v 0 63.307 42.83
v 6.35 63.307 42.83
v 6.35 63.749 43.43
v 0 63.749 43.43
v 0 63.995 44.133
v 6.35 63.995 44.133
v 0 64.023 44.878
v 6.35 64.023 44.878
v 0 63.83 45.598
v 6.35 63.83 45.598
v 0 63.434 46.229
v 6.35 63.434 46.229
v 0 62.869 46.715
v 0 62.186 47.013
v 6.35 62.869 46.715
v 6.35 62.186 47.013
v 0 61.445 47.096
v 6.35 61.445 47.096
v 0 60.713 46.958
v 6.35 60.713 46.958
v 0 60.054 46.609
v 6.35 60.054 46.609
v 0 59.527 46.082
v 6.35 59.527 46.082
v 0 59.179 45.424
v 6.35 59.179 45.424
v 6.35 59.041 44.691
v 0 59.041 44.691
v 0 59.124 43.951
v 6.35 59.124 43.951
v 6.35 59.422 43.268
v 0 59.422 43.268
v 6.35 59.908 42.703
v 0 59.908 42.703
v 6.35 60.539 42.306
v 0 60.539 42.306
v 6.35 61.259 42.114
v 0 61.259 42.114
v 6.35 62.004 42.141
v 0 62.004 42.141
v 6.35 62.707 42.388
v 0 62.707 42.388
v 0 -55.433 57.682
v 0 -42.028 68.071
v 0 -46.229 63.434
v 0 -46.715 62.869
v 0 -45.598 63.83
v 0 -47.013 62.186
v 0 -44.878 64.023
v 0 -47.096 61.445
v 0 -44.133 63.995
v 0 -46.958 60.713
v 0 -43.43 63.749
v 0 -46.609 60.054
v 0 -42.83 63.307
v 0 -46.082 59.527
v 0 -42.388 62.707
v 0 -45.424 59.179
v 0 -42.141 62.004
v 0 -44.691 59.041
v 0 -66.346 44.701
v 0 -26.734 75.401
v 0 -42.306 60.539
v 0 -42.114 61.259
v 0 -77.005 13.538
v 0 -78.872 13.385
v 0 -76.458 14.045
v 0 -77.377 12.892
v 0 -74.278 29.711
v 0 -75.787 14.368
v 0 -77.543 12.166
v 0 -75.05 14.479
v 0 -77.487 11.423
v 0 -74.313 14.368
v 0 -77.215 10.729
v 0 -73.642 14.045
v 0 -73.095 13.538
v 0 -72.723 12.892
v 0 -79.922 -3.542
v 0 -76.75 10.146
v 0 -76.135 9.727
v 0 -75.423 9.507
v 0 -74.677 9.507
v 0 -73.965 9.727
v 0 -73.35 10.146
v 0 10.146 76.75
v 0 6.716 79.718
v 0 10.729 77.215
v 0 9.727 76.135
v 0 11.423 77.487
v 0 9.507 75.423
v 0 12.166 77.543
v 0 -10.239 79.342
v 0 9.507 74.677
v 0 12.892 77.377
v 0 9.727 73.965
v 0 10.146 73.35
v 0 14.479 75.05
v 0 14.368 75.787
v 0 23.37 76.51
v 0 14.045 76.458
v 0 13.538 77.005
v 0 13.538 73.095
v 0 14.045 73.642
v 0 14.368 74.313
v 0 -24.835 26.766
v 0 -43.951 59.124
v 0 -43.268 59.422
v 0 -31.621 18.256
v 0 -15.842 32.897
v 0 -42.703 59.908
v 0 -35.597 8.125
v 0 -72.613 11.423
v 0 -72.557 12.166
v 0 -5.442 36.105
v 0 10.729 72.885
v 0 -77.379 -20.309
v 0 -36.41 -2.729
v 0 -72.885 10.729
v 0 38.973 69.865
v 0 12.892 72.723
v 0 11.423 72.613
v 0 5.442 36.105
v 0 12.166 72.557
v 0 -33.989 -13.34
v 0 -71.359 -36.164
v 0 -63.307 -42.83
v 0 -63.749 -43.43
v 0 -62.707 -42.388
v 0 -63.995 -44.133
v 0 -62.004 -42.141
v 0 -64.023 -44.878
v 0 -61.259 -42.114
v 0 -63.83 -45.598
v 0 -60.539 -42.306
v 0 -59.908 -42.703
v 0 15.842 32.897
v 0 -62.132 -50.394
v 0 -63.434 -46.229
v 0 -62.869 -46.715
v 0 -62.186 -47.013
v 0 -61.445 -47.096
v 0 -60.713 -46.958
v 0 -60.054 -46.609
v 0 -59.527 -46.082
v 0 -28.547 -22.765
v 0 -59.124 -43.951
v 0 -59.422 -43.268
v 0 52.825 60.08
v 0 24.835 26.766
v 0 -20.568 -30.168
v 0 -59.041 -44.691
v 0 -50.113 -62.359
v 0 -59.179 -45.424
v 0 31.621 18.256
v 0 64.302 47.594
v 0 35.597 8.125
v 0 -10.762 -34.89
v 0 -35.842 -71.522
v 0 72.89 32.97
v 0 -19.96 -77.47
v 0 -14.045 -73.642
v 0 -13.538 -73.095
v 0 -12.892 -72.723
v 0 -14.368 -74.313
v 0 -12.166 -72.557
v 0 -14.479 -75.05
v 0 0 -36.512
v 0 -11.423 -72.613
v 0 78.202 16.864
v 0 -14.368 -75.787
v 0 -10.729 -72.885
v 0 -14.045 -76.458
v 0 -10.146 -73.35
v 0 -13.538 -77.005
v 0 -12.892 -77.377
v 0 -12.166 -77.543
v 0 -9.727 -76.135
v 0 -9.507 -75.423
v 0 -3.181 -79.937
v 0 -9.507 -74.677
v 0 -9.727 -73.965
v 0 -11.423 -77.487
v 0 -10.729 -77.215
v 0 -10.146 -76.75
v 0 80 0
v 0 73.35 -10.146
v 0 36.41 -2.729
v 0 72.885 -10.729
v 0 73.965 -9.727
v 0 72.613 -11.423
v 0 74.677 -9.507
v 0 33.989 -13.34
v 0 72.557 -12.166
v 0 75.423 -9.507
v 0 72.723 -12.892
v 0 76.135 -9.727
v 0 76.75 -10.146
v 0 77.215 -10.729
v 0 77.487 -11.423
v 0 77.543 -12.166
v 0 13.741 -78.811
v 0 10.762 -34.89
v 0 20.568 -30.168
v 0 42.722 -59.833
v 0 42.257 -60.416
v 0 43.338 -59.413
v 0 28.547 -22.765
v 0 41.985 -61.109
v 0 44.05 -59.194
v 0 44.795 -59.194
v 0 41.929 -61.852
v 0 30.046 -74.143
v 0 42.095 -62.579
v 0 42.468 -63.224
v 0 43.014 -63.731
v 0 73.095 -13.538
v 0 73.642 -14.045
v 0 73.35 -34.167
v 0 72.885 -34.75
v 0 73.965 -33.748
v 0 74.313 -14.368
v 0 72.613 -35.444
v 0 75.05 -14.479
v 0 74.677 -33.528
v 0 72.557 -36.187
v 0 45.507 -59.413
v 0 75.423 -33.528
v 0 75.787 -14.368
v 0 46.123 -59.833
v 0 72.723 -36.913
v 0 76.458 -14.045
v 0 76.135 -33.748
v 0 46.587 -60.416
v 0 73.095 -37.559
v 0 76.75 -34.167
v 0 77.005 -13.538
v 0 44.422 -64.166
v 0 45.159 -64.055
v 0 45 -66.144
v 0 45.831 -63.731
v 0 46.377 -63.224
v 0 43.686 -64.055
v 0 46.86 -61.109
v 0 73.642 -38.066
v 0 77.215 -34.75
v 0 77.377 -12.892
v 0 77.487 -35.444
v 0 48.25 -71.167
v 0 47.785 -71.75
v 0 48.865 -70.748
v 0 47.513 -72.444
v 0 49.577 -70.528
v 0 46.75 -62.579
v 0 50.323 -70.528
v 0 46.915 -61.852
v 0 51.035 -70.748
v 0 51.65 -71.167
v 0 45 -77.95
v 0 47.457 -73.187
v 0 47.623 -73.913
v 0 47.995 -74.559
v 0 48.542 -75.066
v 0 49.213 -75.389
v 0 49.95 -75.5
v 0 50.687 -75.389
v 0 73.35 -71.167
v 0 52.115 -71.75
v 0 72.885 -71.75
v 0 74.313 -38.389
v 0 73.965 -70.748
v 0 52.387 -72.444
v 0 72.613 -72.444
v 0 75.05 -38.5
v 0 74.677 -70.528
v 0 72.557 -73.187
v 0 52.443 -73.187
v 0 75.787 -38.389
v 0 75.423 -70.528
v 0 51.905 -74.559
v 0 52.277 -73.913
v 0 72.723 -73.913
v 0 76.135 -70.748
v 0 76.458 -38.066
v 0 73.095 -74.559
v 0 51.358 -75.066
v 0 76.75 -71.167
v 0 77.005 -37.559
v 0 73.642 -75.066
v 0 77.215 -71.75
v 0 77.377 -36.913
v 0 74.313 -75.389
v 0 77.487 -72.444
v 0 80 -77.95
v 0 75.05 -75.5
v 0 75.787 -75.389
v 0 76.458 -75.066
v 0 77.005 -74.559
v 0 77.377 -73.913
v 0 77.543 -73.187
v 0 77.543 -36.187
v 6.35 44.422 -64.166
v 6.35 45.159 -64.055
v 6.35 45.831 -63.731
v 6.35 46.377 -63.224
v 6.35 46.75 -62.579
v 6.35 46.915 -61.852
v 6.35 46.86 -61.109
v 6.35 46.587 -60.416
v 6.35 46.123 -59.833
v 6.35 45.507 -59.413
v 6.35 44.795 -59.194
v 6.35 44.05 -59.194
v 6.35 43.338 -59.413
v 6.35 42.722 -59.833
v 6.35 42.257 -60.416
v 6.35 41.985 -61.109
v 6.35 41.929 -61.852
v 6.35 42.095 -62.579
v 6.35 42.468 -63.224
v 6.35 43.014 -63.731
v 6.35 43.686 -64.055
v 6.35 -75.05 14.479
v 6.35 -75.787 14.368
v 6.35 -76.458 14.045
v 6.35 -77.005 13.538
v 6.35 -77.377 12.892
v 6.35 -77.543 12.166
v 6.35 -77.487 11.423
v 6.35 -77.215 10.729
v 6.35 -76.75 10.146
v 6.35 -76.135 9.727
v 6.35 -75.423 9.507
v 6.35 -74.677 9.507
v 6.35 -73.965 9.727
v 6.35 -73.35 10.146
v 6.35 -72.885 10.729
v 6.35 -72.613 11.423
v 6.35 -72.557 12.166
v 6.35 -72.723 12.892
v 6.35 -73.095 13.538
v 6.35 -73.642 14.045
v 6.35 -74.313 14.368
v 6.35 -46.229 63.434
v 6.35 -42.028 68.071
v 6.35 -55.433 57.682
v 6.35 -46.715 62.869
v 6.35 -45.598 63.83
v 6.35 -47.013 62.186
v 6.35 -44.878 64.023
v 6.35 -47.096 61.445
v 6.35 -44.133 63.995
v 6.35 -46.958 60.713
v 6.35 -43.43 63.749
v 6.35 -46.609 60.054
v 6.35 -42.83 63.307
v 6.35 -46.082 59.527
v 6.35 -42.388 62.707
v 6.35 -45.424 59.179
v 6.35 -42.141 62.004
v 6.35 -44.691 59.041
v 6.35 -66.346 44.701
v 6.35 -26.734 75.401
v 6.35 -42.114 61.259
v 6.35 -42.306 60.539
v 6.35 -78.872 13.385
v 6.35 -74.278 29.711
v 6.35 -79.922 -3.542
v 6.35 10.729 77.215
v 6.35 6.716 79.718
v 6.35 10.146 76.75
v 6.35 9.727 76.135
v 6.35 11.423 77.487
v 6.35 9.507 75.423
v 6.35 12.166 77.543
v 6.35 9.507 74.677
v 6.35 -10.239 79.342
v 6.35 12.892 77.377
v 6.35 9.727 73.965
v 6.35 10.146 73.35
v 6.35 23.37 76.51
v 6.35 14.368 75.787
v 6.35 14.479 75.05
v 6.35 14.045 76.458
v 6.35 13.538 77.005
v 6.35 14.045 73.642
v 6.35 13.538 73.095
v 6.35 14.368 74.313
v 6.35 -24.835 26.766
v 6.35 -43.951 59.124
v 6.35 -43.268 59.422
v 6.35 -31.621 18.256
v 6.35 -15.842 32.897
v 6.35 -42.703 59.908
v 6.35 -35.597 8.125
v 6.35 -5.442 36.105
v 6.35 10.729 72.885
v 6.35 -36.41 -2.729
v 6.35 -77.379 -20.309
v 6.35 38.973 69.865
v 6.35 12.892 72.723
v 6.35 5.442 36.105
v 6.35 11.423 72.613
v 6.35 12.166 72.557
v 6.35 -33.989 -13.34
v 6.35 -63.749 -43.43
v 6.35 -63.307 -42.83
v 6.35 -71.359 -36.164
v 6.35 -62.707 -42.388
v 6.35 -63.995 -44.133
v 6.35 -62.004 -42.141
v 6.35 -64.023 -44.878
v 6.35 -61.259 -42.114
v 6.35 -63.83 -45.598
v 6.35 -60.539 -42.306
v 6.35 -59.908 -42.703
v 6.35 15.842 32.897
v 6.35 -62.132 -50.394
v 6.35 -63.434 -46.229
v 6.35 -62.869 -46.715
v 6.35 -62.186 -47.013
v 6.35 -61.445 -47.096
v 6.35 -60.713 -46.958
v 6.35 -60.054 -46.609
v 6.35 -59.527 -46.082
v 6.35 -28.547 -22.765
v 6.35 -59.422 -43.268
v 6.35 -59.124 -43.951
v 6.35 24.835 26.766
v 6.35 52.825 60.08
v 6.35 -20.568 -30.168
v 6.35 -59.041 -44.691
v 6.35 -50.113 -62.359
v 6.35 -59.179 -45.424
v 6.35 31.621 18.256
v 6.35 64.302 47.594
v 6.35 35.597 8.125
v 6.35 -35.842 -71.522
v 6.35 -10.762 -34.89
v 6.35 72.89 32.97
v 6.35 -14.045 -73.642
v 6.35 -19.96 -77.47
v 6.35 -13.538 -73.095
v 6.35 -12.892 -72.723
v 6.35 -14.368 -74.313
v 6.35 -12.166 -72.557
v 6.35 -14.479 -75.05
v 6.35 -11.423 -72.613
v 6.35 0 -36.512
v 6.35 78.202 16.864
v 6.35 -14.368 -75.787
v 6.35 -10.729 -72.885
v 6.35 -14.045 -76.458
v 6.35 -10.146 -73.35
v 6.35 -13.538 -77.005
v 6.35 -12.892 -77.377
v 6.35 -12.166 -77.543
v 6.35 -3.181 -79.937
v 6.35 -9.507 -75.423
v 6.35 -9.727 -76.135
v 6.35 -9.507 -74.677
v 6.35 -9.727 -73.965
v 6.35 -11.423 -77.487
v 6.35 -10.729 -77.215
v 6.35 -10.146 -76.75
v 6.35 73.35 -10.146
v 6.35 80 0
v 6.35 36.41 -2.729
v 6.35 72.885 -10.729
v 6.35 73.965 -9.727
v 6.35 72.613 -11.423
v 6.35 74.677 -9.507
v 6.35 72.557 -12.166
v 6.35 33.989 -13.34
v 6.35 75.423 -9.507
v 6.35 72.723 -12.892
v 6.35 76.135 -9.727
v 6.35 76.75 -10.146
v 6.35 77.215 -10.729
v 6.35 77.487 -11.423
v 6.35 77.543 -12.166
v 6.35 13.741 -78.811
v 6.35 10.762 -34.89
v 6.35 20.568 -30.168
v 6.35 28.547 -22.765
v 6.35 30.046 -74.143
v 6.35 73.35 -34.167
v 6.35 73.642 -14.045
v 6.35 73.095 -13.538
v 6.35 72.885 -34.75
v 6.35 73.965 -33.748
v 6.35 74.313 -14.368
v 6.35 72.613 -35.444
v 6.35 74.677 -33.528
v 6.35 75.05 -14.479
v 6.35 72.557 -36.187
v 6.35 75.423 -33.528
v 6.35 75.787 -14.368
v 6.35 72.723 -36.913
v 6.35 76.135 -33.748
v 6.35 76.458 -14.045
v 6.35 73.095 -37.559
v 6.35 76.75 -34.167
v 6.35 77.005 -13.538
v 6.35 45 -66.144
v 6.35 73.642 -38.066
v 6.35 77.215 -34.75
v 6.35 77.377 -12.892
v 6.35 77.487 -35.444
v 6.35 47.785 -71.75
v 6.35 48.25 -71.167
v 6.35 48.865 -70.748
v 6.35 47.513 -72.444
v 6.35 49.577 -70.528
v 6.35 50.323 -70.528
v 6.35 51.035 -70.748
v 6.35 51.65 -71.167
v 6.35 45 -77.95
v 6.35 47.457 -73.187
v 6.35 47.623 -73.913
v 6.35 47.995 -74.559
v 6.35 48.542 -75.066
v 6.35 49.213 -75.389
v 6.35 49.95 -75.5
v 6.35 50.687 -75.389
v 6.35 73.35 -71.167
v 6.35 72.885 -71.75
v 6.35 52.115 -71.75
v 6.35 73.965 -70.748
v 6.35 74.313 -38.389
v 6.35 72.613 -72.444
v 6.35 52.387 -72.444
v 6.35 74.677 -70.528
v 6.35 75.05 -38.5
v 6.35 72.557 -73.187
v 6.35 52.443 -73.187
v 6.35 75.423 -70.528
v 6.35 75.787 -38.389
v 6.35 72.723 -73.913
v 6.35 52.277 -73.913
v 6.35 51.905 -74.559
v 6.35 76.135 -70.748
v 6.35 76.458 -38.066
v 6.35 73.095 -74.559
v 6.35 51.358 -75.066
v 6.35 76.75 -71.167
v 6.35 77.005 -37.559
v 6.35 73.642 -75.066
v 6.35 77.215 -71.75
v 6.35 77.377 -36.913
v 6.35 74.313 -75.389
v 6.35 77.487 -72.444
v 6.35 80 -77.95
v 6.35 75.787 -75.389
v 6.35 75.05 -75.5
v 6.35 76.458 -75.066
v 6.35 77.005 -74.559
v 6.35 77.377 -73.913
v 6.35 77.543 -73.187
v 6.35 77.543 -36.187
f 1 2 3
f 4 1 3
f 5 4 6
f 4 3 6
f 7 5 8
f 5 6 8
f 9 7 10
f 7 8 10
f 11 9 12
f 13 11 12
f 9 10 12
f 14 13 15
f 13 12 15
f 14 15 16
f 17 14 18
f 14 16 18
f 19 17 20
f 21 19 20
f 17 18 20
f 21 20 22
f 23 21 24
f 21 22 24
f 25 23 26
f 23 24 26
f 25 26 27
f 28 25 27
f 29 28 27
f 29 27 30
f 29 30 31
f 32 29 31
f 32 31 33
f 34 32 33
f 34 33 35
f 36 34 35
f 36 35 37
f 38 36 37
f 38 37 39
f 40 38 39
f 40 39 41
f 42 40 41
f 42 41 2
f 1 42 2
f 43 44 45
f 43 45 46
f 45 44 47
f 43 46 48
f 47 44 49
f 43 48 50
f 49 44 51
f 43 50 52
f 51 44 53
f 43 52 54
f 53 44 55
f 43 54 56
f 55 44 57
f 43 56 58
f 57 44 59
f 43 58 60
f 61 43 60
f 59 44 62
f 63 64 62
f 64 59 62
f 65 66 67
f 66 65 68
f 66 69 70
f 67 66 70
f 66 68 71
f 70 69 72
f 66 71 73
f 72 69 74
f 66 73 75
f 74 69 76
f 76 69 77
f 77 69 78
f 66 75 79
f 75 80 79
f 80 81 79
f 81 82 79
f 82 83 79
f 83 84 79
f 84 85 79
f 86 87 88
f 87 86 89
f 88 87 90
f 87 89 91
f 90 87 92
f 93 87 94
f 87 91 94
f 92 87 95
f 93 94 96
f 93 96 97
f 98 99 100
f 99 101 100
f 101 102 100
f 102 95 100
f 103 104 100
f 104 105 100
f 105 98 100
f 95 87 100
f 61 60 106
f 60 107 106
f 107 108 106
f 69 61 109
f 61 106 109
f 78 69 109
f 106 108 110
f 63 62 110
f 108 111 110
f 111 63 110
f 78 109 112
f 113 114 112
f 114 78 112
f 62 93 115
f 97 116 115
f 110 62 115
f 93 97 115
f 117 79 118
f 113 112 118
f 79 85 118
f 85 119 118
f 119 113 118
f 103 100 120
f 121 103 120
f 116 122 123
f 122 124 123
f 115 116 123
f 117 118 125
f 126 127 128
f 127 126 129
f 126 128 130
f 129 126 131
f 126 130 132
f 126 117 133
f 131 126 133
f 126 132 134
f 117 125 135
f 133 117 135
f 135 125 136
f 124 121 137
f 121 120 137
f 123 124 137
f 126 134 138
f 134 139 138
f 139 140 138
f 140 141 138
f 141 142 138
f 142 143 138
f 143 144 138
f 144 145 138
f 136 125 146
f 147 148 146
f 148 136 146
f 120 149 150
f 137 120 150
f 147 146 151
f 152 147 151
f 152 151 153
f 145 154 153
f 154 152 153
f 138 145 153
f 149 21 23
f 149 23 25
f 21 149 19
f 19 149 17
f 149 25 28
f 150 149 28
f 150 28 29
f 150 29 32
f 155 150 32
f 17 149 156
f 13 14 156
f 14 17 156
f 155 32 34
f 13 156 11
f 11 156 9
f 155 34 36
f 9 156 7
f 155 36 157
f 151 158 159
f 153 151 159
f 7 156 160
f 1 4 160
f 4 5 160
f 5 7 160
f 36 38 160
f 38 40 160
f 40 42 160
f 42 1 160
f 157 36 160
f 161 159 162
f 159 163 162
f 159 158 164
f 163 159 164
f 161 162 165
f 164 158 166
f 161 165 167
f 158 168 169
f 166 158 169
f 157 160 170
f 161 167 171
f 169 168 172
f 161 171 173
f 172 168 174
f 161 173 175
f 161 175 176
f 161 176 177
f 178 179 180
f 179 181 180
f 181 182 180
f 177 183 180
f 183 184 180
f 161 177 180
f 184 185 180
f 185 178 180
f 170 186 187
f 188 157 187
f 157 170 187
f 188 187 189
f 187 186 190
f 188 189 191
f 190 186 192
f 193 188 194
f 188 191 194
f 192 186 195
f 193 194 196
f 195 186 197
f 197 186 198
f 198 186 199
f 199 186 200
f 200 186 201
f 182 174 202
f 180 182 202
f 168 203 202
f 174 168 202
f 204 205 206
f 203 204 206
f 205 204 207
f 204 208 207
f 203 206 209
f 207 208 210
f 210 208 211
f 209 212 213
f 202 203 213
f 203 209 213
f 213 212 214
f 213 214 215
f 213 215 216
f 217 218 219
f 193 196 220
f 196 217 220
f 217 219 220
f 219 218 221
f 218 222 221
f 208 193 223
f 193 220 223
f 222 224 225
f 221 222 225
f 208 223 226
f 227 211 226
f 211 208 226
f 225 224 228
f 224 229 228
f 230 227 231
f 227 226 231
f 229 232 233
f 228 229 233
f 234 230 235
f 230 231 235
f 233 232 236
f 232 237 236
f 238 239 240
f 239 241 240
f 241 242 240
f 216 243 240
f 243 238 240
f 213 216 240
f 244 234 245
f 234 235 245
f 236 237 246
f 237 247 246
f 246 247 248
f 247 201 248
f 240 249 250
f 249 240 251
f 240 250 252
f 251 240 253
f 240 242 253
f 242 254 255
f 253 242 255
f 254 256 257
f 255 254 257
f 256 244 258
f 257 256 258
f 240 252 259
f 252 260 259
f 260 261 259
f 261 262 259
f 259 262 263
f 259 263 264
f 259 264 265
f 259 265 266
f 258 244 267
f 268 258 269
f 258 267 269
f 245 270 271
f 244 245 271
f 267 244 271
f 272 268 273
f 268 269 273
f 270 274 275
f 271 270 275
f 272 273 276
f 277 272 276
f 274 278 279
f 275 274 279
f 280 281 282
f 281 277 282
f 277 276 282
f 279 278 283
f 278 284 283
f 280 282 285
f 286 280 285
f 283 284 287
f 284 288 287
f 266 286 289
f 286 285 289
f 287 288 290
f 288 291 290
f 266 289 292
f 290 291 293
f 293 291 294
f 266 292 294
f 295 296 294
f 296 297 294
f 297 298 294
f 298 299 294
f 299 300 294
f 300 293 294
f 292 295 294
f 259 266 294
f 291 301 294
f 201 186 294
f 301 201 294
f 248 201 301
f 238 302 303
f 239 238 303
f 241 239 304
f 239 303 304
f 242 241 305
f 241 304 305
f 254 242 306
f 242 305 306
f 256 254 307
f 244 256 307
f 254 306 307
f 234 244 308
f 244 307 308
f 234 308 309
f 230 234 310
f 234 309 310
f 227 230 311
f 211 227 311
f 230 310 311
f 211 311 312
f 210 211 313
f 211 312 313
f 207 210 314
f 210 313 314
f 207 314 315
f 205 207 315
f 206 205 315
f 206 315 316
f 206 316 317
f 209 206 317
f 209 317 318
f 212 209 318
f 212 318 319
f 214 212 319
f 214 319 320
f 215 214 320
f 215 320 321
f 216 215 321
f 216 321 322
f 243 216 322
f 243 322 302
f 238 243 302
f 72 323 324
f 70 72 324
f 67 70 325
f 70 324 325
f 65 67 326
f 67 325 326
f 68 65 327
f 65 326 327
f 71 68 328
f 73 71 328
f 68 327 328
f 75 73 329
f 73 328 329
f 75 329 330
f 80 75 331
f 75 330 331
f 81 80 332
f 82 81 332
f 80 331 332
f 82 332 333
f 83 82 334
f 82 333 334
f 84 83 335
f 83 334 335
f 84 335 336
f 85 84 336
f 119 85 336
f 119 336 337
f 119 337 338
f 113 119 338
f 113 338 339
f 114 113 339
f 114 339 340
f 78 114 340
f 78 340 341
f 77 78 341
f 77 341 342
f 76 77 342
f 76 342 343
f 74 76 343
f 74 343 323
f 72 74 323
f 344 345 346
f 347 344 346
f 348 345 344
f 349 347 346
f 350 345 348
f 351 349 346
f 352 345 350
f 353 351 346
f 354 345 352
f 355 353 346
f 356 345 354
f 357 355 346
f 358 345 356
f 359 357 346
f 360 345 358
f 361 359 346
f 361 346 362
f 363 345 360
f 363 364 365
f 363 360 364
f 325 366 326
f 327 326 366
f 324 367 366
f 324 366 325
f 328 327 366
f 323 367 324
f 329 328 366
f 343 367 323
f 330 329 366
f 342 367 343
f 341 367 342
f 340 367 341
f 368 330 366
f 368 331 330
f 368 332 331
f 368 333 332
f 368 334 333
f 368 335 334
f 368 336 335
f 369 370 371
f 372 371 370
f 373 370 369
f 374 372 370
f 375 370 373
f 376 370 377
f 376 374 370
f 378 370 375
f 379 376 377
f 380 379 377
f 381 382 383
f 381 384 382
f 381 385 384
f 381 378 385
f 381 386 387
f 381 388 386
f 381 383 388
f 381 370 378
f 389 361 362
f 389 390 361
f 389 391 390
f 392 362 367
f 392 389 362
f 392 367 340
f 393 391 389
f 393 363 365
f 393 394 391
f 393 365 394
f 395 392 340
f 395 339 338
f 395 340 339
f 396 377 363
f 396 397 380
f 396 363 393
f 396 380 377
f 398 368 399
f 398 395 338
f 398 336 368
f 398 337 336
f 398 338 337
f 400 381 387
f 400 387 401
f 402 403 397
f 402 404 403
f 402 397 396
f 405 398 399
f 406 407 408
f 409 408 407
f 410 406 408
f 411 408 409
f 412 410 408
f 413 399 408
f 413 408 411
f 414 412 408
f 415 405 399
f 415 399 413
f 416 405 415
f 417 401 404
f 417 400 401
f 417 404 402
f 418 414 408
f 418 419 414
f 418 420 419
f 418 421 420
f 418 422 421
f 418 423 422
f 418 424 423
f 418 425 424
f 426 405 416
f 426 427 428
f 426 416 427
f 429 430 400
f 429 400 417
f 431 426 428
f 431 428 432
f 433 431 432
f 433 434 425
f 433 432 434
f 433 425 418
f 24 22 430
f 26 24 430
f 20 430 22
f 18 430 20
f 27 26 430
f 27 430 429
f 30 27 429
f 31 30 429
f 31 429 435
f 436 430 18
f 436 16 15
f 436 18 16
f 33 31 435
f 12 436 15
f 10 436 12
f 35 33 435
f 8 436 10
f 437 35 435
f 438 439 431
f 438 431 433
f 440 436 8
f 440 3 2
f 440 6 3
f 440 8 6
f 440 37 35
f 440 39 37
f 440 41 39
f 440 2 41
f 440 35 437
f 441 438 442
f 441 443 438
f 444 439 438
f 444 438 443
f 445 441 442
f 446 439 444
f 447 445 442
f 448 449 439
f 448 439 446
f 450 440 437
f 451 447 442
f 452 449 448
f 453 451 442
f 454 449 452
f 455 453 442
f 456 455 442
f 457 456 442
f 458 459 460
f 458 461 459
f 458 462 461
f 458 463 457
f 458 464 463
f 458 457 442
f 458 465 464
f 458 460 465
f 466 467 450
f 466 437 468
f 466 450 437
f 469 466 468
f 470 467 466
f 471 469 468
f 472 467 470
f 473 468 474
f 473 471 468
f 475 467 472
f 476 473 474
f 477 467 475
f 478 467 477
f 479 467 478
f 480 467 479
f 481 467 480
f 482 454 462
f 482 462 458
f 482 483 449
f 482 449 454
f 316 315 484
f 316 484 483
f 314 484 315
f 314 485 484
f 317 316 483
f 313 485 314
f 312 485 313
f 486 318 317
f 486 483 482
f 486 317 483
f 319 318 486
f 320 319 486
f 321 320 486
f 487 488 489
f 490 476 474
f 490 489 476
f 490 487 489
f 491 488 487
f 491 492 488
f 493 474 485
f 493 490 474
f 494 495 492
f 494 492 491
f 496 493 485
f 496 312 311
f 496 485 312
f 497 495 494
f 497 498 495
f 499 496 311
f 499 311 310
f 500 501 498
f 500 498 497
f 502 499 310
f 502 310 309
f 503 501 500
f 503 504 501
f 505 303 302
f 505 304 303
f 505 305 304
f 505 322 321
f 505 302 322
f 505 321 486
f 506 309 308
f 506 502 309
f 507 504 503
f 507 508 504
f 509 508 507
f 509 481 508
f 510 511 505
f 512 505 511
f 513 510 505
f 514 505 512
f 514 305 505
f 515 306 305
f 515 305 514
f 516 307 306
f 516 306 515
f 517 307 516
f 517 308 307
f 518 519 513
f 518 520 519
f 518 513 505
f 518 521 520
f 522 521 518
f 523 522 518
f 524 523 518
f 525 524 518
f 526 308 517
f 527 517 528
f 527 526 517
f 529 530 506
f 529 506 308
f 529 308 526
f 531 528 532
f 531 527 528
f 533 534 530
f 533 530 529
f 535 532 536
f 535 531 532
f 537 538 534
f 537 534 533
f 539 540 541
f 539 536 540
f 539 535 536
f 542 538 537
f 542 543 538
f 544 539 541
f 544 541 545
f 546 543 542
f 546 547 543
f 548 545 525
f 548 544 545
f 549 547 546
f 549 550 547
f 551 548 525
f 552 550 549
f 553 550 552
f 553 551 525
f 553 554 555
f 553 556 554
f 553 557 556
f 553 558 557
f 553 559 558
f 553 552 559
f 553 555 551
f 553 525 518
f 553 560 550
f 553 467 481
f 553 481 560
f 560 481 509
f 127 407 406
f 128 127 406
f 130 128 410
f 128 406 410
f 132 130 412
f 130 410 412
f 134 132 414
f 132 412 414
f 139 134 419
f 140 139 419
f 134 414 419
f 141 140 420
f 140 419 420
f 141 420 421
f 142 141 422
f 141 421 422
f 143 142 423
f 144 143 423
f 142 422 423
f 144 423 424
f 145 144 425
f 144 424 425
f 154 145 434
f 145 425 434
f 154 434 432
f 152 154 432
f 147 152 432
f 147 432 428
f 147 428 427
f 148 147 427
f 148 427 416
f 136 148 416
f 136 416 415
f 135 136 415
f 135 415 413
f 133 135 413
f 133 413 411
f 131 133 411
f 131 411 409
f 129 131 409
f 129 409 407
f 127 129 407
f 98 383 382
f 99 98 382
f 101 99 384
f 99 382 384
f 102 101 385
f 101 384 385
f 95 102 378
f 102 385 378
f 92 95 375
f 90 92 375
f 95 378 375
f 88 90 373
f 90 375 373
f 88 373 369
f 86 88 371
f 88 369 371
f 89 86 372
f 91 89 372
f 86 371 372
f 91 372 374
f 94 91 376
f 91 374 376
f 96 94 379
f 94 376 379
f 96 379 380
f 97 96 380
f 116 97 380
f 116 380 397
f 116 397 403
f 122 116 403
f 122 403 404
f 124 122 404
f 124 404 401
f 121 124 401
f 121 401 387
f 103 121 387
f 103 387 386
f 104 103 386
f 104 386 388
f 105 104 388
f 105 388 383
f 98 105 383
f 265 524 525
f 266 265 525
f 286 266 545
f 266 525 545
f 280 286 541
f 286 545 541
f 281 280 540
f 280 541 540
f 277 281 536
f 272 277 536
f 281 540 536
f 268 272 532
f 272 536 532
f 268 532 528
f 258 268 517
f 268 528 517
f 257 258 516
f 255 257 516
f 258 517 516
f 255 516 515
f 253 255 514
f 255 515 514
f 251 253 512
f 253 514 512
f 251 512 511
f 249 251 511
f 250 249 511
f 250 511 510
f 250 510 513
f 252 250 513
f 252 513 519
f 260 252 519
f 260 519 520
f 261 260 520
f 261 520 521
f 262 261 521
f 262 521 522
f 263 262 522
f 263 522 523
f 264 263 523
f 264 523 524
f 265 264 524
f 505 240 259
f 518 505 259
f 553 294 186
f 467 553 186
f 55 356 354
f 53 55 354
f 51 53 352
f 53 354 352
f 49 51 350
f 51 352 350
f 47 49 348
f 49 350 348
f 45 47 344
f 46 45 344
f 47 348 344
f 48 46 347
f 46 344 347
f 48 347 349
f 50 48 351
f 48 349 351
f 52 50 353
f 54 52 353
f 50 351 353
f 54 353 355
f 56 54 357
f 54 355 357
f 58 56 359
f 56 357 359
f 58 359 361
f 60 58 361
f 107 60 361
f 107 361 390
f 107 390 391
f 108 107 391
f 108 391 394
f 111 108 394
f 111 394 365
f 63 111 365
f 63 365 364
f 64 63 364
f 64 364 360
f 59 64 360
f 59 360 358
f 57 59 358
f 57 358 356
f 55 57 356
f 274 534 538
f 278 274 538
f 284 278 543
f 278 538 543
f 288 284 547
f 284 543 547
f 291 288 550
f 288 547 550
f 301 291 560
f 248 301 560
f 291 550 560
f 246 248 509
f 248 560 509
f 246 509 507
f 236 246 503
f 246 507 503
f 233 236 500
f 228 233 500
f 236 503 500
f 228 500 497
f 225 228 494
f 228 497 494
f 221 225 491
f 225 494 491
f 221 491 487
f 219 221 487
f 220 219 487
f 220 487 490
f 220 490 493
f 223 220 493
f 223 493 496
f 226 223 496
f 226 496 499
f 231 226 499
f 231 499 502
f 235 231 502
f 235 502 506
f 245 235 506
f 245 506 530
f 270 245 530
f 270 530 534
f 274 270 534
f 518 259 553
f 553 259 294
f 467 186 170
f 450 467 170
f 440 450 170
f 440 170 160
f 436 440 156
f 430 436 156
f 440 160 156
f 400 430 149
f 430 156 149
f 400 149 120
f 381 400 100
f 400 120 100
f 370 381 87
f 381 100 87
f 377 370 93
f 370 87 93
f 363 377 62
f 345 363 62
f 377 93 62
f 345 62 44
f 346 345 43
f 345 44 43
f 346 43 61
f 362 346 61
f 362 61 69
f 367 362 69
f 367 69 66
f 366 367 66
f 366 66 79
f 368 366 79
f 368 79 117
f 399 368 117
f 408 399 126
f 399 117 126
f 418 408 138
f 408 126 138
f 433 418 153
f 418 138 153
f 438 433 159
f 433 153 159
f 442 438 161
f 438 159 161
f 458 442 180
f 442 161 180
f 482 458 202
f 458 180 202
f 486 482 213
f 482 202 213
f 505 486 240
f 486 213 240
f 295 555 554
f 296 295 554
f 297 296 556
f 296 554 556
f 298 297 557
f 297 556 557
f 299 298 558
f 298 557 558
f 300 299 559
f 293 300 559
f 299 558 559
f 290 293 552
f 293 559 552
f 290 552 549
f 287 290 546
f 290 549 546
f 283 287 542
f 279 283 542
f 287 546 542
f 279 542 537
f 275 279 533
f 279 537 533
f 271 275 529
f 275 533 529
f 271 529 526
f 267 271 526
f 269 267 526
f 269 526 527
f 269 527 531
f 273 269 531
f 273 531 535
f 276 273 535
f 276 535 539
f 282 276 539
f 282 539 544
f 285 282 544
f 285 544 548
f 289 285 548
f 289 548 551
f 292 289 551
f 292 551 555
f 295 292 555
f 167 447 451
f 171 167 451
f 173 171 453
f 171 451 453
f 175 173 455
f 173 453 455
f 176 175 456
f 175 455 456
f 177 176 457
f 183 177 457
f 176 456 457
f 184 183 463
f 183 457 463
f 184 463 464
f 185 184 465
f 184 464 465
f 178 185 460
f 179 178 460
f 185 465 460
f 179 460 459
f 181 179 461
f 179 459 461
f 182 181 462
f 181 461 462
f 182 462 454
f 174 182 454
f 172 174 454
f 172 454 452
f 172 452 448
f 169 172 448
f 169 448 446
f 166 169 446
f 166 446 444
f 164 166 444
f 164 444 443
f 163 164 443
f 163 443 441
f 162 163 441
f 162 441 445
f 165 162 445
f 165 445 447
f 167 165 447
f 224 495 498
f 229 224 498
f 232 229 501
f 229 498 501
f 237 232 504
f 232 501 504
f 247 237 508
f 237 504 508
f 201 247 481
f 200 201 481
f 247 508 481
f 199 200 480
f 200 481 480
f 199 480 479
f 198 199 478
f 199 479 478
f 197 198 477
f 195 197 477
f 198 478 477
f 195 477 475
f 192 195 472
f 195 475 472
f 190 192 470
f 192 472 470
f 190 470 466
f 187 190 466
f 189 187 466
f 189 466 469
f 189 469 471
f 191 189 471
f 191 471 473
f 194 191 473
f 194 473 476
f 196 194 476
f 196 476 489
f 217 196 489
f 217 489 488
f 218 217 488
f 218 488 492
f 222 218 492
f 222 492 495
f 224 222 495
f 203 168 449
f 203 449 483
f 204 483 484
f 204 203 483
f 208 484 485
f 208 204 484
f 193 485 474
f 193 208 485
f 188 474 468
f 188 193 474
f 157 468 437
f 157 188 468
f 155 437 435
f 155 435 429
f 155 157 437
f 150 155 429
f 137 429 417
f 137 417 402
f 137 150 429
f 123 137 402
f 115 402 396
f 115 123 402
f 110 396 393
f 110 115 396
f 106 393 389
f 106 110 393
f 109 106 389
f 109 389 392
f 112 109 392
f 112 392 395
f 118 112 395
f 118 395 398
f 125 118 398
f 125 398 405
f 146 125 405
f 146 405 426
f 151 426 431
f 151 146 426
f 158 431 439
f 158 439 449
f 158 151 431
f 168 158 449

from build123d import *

# Parameters (mm, degrees)
SKETCH1_R           = 36.5125
BOSS_EXTRUDE1_DEPTH = 6.35
SKETCH3_R           = 2.5
CUT_EXTRUDE1_DEPTH  = 114.315146825
CIRPATTERN1_COUNT   = 8
SKETCH4_R           = 2.5
CUT_EXTRUDE4_DEPTH  = 114.315146825


with BuildPart() as part:
    # Sketch1 → Boss-Extrude1 (new body)
    with BuildSketch(Plane(origin=(0, 0, 0), x_dir=(0, 0, -1), z_dir=(1, 0, 0))):
        with BuildLine():
            Line((77.95, 80), (0, 80))
            ThreePointArc((0, 80), (-37.416573868, -70.710678119), (66.143782777, 45))
            Line((66.143782777, 45), (77.95, 45))
            Line((77.95, 45), (77.95, 80))
        make_face()
        Circle(SKETCH1_R, mode=Mode.SUBTRACT)
    extrude(amount=BOSS_EXTRUDE1_DEPTH)

    # Sketch3 → Cut-Extrude1 (cut, through all)
    with BuildSketch(Plane(origin=(6.35, 0, 0), x_dir=(0, 0, -1), z_dir=(1, 0, 0))):
        with Locations((11.979044202, 75.05)):
            Circle(SKETCH3_R)
    cut_extrude1 = extrude(amount=-CUT_EXTRUDE1_DEPTH, mode=Mode.SUBTRACT)

    # CirPattern1: Cut-Extrude1 ×8 about axis, 1 skipped
    cirpattern1_axis = Axis((0, 0, 0), (1, 0, 0))
    add([cut_extrude1.rotate(cirpattern1_axis, i * 360 / CIRPATTERN1_COUNT) for i in range(1, CIRPATTERN1_COUNT) if i not in (7,)], mode=Mode.SUBTRACT)

    # Sketch4 → Cut-Extrude4 (cut, through all)
    with BuildSketch(Plane(origin=(6.35, 0, 0), x_dir=(0, 0, -1), z_dir=(1, 0, 0))):
        with Locations((36, 75.05)):
            Circle(SKETCH4_R)
        with Locations((73, 75.05)):
            Circle(SKETCH4_R)
        with Locations((73, 49.95)):
            Circle(SKETCH4_R)
        with Locations((61.665635624, 44.422397314)):
            Circle(SKETCH4_R)
    extrude(amount=-CUT_EXTRUDE4_DEPTH, mode=Mode.SUBTRACT)


solid = part.part
